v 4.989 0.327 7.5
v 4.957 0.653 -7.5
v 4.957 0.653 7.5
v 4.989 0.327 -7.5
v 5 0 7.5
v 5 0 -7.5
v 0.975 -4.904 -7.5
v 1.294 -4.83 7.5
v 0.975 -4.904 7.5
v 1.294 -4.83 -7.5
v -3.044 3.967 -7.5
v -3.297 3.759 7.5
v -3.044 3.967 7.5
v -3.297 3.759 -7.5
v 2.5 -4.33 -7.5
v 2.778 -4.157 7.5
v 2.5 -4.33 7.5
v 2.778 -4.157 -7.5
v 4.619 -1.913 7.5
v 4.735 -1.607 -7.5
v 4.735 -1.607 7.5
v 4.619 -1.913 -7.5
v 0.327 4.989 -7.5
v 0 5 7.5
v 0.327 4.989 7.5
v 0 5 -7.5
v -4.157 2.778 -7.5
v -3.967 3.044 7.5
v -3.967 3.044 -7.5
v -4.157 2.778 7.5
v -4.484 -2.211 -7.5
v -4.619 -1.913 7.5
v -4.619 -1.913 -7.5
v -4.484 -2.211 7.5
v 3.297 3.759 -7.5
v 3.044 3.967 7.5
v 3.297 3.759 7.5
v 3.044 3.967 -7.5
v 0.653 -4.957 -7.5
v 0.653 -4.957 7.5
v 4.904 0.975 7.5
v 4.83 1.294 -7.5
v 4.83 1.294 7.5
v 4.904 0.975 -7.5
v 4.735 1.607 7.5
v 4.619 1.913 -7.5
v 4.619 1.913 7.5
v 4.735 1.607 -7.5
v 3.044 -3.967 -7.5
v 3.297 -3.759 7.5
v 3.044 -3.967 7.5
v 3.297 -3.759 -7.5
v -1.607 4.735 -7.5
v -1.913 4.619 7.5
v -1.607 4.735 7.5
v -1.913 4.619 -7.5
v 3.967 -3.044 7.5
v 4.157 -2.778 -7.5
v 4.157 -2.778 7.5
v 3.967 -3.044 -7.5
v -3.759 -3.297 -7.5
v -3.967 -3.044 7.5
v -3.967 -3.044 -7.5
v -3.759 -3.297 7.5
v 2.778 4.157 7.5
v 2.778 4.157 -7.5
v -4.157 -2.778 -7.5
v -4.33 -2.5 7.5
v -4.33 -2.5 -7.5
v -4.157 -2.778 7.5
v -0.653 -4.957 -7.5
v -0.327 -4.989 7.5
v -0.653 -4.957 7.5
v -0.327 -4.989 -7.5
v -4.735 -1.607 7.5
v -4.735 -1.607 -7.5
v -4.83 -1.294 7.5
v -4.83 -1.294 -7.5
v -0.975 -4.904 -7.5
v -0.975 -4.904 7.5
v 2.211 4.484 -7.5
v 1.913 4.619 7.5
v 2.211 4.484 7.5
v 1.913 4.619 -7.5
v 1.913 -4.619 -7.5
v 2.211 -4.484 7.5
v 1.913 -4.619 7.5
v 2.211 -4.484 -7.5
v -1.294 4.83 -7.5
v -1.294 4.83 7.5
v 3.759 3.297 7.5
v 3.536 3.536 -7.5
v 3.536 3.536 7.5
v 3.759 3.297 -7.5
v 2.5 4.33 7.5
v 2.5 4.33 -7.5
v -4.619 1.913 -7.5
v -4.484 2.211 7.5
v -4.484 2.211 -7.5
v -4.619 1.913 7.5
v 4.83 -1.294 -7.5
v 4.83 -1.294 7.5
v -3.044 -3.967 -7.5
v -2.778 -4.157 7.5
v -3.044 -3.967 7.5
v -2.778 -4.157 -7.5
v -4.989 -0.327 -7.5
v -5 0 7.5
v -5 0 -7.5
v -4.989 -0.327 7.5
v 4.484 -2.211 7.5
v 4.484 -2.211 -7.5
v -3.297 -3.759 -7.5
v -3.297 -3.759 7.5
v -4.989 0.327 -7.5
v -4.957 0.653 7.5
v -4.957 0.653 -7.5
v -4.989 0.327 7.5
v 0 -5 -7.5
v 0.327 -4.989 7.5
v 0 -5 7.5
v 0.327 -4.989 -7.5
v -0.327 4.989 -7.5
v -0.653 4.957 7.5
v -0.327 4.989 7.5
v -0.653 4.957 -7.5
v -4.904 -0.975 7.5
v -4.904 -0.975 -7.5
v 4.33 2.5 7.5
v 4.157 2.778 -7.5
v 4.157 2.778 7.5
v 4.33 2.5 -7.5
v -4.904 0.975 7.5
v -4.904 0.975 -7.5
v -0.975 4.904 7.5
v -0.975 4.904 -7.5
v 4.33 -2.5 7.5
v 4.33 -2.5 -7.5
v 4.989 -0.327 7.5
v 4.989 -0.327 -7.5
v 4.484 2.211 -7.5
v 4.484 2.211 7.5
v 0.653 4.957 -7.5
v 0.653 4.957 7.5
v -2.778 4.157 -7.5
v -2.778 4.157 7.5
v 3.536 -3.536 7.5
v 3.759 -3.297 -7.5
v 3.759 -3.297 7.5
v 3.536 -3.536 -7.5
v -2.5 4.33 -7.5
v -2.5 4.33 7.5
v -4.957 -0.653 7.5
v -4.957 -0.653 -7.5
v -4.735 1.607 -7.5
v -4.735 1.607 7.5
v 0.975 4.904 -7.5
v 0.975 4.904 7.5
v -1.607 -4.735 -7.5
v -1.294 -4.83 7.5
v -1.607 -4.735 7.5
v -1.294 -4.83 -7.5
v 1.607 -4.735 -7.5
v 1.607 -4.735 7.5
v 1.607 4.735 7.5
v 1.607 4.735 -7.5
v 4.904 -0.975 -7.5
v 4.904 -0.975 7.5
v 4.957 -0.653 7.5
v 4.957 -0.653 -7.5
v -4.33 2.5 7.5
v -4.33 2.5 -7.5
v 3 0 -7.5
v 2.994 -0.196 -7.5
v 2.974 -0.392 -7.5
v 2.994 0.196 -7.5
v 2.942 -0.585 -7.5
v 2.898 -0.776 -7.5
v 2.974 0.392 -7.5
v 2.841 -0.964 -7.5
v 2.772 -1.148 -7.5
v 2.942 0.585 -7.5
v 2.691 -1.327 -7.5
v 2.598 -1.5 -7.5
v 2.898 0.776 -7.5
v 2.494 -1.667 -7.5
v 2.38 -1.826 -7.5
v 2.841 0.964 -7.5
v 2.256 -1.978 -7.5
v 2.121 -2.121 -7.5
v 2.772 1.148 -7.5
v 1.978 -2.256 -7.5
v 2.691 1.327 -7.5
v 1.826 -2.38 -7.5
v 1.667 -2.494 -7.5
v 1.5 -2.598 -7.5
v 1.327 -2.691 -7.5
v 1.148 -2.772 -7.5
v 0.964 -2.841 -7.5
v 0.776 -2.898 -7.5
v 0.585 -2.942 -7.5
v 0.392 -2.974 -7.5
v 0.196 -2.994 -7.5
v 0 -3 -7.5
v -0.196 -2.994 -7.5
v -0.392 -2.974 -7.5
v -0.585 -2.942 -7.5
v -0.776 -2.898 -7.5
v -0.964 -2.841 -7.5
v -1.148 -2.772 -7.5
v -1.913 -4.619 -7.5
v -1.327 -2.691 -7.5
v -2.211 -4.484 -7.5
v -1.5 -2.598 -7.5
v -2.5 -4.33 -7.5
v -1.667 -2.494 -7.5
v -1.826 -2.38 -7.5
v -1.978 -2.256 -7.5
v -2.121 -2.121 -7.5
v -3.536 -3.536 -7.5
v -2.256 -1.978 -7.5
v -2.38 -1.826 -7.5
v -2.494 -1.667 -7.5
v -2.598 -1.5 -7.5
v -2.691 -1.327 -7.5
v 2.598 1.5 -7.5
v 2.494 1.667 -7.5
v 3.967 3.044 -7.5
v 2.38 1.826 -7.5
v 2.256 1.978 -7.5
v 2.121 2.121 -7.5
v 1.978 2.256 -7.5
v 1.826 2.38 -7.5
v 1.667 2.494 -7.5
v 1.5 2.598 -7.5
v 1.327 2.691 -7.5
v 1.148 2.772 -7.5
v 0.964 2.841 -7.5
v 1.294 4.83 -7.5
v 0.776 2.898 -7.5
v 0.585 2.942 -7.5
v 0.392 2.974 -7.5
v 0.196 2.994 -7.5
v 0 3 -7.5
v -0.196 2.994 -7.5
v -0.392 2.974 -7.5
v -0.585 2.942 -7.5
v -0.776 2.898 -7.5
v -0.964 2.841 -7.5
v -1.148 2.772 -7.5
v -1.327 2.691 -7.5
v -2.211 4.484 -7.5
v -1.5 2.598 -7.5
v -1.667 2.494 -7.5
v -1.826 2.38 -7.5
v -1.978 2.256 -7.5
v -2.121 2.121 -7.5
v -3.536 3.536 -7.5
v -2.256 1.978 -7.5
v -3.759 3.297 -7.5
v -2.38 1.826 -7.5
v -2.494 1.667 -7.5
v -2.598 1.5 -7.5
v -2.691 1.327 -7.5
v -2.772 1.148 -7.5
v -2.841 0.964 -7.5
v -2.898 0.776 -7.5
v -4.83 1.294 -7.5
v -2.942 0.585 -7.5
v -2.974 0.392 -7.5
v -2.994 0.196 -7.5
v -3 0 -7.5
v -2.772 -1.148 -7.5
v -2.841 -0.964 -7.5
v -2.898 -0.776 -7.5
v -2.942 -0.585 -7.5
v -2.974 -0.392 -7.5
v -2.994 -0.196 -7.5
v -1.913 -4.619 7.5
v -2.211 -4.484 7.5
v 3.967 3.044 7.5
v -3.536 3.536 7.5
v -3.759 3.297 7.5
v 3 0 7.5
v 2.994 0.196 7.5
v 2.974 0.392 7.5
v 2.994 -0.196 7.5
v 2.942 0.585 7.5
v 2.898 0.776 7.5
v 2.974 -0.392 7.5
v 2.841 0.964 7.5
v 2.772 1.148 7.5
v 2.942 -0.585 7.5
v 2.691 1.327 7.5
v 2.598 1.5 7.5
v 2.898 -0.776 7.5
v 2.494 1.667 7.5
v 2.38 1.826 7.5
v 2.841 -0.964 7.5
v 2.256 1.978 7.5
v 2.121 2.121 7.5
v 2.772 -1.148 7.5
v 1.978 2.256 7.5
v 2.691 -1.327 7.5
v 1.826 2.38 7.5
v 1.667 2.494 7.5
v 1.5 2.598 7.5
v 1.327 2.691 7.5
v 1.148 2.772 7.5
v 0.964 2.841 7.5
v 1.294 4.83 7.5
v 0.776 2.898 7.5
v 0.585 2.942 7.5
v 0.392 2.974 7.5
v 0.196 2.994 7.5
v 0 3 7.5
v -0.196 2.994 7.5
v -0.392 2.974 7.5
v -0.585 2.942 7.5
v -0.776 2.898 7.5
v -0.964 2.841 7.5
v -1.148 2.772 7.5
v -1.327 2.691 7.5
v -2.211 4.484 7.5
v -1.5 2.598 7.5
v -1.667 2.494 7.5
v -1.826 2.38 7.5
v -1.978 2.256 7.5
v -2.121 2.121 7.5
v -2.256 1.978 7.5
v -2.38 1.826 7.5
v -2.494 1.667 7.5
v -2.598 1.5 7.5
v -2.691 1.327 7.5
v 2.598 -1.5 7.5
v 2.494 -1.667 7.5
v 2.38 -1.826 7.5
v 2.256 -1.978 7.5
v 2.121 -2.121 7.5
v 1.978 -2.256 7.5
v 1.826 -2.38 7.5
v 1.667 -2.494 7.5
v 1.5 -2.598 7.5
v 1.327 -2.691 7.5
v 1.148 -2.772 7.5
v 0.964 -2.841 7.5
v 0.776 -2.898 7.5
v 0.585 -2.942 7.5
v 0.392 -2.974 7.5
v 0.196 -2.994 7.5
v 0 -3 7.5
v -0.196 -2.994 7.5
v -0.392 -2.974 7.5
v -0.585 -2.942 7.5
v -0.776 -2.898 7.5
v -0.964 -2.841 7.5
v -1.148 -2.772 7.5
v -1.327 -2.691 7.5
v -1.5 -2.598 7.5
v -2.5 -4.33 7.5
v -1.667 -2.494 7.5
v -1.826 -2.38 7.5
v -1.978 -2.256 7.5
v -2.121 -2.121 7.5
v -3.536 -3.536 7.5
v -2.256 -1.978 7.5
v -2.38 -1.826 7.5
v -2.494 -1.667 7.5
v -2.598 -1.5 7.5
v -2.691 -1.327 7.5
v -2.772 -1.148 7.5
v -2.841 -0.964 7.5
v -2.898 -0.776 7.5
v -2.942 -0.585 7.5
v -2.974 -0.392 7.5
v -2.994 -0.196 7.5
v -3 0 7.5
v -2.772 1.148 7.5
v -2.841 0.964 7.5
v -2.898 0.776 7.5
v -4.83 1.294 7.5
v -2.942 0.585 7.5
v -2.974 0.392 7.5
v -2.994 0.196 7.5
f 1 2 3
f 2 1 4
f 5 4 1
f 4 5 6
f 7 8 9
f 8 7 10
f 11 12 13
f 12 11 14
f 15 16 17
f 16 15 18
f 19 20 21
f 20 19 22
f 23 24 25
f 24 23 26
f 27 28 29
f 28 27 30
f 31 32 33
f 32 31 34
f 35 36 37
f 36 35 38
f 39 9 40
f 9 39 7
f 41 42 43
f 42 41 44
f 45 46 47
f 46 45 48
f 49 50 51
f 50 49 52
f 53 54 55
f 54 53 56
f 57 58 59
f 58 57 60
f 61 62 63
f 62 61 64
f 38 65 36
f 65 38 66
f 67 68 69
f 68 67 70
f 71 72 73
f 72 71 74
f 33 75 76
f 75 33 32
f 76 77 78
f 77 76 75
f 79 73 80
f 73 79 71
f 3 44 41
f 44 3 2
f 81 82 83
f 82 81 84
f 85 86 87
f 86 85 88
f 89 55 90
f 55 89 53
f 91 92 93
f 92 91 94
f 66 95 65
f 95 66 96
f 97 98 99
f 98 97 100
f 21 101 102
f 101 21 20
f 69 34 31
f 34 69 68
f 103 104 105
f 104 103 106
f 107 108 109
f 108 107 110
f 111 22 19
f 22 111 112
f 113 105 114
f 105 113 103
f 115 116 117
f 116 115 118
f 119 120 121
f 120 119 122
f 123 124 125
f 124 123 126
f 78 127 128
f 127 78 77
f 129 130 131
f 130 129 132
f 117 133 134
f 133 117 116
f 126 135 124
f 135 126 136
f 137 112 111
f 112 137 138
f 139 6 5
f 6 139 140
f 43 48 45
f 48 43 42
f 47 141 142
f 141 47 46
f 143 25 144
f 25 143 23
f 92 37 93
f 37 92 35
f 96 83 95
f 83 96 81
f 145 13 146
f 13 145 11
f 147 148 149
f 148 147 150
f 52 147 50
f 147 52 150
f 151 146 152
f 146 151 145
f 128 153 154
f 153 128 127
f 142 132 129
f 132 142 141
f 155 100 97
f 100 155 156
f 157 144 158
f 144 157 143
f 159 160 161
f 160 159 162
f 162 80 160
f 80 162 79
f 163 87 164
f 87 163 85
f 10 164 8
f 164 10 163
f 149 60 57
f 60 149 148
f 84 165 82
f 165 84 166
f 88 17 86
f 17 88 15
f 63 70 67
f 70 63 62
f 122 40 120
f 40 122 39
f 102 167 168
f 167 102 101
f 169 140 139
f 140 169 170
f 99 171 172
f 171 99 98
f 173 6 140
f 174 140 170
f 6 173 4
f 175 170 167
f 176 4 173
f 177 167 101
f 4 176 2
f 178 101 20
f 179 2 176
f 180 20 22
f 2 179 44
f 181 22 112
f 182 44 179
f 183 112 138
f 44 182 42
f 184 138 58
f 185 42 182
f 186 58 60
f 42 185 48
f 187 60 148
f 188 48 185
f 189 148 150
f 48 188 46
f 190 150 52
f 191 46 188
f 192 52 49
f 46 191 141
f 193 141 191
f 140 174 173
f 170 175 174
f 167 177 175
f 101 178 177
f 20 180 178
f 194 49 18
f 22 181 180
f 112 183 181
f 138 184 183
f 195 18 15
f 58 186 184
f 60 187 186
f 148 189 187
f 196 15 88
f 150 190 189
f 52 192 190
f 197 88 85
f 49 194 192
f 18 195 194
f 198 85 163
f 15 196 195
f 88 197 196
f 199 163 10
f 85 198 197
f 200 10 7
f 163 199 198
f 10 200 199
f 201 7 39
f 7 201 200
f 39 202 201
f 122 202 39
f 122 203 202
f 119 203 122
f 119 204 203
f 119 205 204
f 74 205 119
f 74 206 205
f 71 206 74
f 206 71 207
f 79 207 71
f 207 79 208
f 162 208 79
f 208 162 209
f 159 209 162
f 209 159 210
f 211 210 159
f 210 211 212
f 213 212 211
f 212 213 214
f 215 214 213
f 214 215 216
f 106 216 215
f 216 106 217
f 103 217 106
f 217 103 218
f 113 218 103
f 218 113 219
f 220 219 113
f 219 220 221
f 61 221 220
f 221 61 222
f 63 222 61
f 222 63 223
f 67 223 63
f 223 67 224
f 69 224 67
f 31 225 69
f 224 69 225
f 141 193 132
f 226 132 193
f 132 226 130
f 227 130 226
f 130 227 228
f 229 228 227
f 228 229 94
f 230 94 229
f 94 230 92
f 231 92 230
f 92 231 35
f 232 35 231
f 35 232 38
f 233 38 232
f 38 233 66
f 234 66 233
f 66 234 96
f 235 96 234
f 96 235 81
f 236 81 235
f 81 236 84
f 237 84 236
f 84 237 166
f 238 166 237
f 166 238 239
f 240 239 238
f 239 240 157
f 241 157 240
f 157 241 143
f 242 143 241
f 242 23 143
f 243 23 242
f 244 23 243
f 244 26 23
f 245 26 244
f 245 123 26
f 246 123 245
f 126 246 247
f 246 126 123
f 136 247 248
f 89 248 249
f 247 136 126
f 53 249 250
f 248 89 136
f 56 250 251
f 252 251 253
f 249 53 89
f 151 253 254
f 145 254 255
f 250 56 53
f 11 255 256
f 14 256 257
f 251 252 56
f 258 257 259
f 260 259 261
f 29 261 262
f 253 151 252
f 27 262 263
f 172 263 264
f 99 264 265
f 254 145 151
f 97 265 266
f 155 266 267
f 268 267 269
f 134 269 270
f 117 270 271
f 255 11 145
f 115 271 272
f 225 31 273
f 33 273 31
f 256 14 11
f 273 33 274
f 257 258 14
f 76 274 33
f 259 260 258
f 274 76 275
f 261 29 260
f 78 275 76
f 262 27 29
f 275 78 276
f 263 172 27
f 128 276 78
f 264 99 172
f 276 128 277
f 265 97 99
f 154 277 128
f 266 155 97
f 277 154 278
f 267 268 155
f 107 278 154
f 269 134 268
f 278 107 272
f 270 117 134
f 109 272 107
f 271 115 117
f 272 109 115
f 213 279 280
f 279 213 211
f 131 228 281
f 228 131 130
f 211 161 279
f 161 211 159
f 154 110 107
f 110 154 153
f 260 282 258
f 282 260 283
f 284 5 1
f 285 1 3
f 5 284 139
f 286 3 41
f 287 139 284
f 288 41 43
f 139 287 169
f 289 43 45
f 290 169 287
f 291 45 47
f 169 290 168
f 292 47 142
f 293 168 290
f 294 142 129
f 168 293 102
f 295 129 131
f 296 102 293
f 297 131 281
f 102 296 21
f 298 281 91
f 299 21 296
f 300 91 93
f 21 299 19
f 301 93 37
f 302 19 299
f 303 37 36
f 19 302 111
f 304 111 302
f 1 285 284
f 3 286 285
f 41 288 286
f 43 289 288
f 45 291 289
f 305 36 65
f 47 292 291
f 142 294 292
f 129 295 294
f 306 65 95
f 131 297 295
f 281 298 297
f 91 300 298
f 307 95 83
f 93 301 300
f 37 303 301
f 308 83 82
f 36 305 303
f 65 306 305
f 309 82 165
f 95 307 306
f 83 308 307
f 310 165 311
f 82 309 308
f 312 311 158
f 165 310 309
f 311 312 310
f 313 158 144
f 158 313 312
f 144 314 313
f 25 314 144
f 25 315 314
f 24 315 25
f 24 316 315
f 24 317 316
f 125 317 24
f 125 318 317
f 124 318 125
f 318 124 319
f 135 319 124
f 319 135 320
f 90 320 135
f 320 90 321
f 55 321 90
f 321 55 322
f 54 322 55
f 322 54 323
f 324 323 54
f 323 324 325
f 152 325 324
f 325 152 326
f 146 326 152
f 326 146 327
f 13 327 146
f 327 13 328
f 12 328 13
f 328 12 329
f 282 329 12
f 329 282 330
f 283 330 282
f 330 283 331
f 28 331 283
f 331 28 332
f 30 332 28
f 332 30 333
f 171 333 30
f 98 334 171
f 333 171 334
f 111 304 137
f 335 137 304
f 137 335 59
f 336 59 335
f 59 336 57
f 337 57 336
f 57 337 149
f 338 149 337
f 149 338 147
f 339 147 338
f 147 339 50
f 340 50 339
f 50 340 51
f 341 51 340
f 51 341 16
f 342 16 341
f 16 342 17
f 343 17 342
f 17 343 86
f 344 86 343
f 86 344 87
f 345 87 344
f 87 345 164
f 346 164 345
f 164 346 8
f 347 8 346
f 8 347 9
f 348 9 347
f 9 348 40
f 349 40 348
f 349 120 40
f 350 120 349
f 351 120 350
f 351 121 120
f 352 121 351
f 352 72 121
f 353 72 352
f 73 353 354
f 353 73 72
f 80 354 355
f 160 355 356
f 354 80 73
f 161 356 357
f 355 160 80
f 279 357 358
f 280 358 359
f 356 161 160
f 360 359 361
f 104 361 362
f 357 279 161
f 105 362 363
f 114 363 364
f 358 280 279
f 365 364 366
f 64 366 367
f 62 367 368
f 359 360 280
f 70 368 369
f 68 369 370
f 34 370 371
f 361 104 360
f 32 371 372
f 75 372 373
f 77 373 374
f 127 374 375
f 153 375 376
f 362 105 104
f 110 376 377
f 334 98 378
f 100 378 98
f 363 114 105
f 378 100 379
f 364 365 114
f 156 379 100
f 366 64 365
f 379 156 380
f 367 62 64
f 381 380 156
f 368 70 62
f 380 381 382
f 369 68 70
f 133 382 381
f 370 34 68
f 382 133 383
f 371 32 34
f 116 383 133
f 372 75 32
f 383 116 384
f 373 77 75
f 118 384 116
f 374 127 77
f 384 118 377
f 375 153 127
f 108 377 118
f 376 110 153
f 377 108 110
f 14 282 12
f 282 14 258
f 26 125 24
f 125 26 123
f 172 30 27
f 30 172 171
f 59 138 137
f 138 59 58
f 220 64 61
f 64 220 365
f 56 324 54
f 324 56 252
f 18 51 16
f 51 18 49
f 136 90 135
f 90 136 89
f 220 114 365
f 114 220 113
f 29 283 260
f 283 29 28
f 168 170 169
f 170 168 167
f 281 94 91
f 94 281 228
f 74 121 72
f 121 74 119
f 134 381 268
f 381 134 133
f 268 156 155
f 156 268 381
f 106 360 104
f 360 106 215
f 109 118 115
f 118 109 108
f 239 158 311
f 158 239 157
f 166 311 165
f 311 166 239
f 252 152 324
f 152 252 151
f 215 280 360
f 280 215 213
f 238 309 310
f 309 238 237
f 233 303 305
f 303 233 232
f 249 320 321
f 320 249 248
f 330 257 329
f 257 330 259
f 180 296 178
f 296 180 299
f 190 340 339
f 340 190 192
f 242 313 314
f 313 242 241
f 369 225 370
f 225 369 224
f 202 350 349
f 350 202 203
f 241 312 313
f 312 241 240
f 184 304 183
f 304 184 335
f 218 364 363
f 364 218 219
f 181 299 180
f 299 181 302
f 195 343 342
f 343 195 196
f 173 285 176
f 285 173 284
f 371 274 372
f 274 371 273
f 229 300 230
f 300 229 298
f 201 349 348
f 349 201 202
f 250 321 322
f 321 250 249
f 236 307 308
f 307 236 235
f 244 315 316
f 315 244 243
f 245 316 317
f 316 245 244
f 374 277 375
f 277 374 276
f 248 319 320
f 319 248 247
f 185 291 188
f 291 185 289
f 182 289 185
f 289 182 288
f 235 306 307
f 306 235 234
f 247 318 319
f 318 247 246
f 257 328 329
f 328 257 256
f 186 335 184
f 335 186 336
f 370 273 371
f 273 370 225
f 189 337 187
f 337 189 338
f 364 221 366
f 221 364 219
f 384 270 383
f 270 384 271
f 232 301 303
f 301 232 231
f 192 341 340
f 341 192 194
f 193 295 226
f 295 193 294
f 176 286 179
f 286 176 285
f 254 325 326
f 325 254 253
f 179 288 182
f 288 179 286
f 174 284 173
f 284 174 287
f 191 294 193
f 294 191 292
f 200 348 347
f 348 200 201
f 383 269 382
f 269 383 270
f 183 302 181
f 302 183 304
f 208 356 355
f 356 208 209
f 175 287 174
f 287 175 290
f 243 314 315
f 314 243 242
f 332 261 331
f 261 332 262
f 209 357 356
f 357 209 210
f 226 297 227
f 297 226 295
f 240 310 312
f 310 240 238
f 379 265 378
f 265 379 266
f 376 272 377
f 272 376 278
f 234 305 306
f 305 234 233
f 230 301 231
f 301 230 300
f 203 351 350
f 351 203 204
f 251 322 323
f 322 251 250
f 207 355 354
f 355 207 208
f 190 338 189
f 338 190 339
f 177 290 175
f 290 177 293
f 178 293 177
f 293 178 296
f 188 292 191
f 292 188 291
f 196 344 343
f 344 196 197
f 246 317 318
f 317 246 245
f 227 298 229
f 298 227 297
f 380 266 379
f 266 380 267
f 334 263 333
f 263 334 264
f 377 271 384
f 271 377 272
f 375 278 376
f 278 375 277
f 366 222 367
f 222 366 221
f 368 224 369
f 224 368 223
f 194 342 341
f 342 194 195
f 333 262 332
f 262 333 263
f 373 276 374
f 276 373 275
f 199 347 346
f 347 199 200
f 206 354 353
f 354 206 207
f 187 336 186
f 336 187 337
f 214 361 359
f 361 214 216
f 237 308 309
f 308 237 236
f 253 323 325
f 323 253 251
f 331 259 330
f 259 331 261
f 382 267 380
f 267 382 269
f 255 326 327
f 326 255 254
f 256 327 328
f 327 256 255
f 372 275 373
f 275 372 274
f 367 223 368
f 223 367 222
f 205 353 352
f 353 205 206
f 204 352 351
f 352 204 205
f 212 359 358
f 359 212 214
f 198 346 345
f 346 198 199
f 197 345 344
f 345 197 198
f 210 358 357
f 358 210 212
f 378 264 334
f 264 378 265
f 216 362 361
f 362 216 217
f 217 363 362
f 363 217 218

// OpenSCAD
// Parameters
length = 15; //[7.5:30:0.5]
outer_diameter = 10; //[5:20:0.5]
inner_diameter = 6; //[3:18:0.5]
forced_id = 0; //[0:18:0.5]
center = 1; //[0:1:1]
eps_overlap = 0.8; //[0.5:2:0.1]

$fn = 96;

// Tubing - single connected solid (hollow cylinder)
module tubing() {
  od = outer_diameter;
  id_req = (forced_id > 0) ? forced_id : inner_diameter;

  // Ensure valid wall thickness
  min_wall = 0.2;
  id_max = max(0, od - 2*min_wall);
  id = min(max(0, id_req), id_max);

  // Positioning: centered or sitting on Z=0
  zc = (center == 1) ? 0 : length/2;

  color([0.2, 0.2, 0.2])  // Neoprene color
  translate([0, 0, zc])
    difference() {
      cylinder(d=od, h=length, center=true);
      cylinder(d=id, h=length + 2*eps_overlap, center=true);
    }
}

module assembly() {
  tubing();
}

assembly();
